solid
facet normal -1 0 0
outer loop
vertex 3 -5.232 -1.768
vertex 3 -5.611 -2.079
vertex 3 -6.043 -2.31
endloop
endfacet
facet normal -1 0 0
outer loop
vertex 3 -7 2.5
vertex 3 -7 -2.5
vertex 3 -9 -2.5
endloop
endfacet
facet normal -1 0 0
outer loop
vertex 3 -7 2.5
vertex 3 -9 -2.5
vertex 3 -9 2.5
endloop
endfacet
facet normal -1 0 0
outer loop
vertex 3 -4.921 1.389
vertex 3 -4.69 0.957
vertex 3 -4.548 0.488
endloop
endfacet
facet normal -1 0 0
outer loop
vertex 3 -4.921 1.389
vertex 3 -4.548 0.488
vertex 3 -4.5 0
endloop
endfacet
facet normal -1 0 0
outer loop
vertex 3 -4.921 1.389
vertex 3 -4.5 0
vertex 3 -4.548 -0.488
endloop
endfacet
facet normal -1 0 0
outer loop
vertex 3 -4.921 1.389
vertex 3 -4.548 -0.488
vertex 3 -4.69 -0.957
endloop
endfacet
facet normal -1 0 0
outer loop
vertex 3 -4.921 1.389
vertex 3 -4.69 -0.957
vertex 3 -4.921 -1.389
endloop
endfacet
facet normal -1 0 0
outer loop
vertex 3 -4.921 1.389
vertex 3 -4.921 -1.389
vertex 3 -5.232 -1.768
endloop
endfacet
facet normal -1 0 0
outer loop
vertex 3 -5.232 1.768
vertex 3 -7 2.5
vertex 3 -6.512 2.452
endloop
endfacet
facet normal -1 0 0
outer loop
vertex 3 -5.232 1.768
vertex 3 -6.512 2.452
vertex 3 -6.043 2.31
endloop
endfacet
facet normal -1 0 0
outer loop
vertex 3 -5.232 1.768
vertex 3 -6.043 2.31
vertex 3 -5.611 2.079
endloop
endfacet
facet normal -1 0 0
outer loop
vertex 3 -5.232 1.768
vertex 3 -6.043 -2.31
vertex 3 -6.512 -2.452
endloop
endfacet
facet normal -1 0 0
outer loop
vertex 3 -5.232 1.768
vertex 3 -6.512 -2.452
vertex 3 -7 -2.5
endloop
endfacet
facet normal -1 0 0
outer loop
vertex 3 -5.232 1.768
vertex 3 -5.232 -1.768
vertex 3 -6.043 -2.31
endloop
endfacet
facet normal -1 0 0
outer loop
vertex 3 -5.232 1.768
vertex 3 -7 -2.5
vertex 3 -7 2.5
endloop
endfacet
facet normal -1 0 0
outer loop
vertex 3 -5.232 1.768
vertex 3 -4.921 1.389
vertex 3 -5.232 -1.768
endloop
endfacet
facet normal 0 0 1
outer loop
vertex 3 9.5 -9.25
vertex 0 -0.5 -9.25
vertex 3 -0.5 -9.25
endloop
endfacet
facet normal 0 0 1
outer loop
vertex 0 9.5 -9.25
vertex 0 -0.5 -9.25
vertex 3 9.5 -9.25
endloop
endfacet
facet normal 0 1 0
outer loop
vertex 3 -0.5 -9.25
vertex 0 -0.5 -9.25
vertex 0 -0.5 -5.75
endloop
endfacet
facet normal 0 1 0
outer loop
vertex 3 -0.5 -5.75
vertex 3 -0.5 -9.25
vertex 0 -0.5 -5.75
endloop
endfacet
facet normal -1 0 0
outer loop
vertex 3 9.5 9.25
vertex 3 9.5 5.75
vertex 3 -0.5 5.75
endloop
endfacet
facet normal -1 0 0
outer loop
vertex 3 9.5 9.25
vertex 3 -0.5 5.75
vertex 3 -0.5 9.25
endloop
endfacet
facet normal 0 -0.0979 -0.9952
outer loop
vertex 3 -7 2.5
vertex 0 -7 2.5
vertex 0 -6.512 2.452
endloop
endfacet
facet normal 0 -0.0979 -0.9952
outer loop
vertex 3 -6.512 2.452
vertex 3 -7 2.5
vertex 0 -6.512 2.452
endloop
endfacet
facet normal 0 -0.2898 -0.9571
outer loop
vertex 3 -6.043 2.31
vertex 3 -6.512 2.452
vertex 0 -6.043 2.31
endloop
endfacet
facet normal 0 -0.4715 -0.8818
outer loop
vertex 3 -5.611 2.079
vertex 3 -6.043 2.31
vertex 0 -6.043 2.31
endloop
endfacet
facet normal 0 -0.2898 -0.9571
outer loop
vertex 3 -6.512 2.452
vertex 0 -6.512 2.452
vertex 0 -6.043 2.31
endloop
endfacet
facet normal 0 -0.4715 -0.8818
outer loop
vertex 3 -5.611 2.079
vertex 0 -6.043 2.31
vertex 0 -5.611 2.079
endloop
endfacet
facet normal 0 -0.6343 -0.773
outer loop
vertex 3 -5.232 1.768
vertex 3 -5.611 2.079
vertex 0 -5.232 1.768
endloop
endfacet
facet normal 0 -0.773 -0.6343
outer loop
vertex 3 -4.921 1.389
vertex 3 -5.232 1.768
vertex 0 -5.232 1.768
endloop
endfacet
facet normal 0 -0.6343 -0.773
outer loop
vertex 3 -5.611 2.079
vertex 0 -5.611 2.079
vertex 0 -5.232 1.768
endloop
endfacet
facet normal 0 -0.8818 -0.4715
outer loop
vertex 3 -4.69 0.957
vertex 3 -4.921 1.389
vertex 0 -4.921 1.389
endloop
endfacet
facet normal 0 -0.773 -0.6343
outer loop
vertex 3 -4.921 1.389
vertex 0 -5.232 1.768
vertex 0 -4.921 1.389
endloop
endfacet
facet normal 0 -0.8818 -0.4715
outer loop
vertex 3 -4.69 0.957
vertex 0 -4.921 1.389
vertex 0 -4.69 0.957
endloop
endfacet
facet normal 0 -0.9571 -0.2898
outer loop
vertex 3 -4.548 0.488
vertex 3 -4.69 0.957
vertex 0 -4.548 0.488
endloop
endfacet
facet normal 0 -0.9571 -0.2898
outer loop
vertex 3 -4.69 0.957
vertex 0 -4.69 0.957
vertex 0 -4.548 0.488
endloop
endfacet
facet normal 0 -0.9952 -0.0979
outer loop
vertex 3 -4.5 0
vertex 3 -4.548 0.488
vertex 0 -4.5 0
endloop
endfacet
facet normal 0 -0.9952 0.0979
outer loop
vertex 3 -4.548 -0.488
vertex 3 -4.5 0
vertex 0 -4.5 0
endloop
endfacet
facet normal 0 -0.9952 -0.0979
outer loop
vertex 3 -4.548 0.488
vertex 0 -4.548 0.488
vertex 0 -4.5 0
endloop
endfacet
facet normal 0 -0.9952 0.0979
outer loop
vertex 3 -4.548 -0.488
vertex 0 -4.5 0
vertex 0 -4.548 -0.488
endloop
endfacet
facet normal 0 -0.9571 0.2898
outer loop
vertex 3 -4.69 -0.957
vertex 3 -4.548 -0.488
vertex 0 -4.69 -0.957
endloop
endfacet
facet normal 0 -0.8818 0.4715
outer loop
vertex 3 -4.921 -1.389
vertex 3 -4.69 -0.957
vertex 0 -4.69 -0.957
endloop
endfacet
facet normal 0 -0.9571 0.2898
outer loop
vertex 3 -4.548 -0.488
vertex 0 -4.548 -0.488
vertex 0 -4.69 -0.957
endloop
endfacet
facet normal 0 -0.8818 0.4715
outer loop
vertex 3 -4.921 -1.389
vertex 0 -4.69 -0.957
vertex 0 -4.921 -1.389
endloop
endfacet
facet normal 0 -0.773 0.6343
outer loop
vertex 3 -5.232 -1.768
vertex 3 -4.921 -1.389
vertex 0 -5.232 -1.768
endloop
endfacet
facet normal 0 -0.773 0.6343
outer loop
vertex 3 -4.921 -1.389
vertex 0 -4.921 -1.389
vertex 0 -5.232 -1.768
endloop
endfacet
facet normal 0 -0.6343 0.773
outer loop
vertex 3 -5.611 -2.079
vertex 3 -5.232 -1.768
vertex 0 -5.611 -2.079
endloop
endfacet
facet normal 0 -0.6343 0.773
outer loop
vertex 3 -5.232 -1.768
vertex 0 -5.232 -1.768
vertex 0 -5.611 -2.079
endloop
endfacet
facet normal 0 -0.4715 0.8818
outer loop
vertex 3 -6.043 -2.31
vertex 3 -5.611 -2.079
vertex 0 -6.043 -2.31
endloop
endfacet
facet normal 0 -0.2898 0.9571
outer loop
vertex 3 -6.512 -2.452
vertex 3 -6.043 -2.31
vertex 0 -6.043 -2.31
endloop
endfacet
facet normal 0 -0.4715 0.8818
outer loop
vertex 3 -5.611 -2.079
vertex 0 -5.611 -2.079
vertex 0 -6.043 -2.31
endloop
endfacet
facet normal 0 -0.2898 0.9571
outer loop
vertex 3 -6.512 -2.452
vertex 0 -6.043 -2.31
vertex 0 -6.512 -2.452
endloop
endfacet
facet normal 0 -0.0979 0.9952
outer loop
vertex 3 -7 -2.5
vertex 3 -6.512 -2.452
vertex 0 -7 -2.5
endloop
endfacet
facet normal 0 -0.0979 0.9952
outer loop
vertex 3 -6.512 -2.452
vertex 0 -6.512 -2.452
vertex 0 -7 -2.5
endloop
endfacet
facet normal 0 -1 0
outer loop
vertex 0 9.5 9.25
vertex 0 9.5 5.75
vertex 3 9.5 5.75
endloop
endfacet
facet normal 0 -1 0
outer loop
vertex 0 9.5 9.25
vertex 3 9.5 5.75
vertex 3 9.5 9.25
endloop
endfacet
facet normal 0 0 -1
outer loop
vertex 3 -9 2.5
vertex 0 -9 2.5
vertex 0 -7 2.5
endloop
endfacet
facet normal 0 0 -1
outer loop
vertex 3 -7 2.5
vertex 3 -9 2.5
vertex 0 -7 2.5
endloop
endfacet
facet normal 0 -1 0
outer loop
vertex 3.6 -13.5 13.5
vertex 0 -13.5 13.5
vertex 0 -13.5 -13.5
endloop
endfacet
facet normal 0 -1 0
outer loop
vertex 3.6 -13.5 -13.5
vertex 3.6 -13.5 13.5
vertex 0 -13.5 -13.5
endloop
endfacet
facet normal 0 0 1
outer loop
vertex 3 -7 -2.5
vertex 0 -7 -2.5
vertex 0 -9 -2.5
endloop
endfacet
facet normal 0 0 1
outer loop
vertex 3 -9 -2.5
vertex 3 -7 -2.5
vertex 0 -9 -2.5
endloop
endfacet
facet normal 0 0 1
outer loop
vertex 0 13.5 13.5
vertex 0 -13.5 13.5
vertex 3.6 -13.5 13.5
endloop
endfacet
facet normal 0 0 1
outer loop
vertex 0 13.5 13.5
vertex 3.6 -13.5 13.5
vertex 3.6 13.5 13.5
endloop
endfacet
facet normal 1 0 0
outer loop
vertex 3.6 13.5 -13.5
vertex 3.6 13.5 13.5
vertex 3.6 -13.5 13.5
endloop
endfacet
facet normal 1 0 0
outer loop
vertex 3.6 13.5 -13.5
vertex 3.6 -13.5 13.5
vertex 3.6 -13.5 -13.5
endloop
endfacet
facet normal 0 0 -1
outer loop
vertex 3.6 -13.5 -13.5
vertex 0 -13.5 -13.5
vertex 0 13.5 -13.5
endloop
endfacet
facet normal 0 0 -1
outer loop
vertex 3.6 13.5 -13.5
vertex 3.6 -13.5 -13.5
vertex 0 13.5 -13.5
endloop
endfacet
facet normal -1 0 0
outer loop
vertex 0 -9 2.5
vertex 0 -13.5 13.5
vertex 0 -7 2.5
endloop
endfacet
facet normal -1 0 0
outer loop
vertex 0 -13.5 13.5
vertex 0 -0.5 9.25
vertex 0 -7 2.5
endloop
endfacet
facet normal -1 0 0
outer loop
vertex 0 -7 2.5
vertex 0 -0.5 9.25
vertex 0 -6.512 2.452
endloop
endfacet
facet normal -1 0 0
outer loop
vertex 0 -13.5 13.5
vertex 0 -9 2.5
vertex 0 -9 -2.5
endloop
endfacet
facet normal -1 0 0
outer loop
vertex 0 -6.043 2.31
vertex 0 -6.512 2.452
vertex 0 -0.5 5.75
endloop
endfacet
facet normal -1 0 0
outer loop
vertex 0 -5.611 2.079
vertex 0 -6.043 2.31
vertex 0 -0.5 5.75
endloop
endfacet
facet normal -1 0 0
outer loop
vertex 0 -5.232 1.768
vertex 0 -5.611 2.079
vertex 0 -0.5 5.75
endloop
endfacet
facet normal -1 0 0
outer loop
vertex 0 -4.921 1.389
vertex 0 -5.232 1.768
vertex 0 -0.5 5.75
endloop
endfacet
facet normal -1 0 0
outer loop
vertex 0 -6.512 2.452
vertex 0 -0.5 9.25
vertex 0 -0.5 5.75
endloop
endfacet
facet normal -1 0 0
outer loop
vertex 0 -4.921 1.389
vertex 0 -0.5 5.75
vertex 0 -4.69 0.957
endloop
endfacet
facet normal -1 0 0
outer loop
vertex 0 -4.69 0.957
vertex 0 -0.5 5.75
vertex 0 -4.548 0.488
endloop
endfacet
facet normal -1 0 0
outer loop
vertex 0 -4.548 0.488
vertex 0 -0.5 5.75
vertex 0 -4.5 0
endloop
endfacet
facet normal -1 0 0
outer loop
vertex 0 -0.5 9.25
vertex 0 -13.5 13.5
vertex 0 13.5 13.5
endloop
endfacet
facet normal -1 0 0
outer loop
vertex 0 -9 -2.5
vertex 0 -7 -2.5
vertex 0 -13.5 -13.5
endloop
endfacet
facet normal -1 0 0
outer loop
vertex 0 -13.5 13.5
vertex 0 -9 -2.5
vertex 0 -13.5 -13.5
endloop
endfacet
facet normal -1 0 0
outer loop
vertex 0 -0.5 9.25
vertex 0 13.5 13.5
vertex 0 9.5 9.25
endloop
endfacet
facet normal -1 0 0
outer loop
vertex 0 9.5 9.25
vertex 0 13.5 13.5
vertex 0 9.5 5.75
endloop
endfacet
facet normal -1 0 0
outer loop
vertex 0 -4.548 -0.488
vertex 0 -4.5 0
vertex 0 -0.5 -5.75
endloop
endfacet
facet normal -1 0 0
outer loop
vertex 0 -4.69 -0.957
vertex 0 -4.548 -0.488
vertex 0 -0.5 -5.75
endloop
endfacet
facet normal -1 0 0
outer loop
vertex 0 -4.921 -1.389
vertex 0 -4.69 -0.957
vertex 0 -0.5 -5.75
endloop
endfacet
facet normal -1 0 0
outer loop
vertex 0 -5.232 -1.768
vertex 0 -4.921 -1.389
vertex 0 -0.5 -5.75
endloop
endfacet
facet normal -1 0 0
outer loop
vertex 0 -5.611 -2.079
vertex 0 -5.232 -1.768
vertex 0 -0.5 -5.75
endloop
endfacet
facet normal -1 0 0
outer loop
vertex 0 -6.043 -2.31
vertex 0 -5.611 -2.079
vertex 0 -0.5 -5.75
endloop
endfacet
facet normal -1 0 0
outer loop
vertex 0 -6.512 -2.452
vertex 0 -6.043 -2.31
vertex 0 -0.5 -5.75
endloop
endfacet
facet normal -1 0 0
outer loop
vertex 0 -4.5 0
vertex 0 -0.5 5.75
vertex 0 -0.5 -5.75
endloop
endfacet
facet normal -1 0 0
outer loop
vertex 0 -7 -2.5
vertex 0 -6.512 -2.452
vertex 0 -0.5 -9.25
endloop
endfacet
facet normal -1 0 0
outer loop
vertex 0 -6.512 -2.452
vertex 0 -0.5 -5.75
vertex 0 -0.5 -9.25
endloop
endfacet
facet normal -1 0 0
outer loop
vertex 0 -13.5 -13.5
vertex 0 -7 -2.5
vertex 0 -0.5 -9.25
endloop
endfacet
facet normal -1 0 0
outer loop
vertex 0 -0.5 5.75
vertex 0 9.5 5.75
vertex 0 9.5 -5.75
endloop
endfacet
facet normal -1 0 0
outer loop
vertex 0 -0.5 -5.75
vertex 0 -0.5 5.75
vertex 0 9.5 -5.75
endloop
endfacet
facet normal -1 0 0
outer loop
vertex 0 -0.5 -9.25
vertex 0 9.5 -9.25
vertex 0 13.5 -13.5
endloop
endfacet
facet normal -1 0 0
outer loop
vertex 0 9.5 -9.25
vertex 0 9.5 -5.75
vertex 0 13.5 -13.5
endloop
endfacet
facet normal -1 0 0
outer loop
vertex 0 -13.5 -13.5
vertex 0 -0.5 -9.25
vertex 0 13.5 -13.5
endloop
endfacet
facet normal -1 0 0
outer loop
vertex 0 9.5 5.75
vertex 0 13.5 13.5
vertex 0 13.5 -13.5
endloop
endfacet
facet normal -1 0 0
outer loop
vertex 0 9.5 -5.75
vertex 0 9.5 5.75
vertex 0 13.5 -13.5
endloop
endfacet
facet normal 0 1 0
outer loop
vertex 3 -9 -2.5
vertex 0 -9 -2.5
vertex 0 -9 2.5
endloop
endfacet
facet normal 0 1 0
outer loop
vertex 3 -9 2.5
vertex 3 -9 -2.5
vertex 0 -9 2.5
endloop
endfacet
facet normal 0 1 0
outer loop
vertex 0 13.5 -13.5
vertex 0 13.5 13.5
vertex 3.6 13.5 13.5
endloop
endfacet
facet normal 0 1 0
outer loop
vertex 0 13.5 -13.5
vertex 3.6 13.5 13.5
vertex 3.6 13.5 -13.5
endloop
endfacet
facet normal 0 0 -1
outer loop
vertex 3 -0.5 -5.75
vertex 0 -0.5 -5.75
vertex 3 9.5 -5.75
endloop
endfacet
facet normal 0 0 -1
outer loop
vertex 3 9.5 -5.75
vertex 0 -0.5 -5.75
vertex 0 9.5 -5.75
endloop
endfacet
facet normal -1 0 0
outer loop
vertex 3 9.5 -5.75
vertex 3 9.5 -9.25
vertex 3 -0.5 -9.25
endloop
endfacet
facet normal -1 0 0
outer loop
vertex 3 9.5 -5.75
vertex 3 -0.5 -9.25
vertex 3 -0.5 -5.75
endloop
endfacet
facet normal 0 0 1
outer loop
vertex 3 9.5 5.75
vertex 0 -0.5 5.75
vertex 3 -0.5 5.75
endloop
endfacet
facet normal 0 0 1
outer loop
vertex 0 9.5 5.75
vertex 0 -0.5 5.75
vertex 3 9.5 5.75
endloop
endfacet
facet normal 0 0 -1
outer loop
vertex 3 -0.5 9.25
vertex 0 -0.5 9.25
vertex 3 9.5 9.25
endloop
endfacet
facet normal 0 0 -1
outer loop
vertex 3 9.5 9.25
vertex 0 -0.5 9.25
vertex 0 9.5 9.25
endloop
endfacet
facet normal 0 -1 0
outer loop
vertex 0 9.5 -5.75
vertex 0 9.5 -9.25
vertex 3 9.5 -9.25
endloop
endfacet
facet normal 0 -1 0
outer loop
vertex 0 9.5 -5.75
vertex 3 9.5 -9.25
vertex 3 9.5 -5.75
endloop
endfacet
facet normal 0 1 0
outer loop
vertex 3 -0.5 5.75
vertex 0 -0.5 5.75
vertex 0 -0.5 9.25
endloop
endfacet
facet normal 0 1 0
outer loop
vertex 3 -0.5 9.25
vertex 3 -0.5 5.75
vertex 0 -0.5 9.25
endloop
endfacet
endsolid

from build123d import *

# Parameters (mm, degrees)
SKETCH1_W           = 27
SKETCH1_H           = 27
BOSS_EXTRUDE1_DEPTH = 3.6
SKETCH2_W           = 3.5
SKETCH2_H           = 10
CUT_EXTRUDE1_DEPTH  = 3


with BuildPart() as part:
    # Sketch1 → Boss-Extrude1 (new body)
    with BuildSketch(Plane(origin=(0, 0, 0), x_dir=(0, 0, -1), z_dir=(1, 0, 0))):
        Rectangle(SKETCH1_W, SKETCH1_H)
    extrude(amount=BOSS_EXTRUDE1_DEPTH)

    # Sketch2 → Cut-Extrude1 (cut)
    with BuildSketch(Plane.ZY):
        with BuildLine():
            Line((-2.5, -7), (-2.5, -9))
            Line((-2.5, -9), (2.5, -9))
            Line((2.5, -9), (2.5, -7))
            ThreePointArc((2.5, -7), (0, -4.5), (-2.5, -7))
        make_face()
        with Locations((-7.5, 4.5)):
            Rectangle(SKETCH2_W, SKETCH2_H)
        with Locations((7.5, 4.5)):
            Rectangle(SKETCH2_W, SKETCH2_H)
    extrude(amount=-CUT_EXTRUDE1_DEPTH, mode=Mode.SUBTRACT)


solid = part.part
